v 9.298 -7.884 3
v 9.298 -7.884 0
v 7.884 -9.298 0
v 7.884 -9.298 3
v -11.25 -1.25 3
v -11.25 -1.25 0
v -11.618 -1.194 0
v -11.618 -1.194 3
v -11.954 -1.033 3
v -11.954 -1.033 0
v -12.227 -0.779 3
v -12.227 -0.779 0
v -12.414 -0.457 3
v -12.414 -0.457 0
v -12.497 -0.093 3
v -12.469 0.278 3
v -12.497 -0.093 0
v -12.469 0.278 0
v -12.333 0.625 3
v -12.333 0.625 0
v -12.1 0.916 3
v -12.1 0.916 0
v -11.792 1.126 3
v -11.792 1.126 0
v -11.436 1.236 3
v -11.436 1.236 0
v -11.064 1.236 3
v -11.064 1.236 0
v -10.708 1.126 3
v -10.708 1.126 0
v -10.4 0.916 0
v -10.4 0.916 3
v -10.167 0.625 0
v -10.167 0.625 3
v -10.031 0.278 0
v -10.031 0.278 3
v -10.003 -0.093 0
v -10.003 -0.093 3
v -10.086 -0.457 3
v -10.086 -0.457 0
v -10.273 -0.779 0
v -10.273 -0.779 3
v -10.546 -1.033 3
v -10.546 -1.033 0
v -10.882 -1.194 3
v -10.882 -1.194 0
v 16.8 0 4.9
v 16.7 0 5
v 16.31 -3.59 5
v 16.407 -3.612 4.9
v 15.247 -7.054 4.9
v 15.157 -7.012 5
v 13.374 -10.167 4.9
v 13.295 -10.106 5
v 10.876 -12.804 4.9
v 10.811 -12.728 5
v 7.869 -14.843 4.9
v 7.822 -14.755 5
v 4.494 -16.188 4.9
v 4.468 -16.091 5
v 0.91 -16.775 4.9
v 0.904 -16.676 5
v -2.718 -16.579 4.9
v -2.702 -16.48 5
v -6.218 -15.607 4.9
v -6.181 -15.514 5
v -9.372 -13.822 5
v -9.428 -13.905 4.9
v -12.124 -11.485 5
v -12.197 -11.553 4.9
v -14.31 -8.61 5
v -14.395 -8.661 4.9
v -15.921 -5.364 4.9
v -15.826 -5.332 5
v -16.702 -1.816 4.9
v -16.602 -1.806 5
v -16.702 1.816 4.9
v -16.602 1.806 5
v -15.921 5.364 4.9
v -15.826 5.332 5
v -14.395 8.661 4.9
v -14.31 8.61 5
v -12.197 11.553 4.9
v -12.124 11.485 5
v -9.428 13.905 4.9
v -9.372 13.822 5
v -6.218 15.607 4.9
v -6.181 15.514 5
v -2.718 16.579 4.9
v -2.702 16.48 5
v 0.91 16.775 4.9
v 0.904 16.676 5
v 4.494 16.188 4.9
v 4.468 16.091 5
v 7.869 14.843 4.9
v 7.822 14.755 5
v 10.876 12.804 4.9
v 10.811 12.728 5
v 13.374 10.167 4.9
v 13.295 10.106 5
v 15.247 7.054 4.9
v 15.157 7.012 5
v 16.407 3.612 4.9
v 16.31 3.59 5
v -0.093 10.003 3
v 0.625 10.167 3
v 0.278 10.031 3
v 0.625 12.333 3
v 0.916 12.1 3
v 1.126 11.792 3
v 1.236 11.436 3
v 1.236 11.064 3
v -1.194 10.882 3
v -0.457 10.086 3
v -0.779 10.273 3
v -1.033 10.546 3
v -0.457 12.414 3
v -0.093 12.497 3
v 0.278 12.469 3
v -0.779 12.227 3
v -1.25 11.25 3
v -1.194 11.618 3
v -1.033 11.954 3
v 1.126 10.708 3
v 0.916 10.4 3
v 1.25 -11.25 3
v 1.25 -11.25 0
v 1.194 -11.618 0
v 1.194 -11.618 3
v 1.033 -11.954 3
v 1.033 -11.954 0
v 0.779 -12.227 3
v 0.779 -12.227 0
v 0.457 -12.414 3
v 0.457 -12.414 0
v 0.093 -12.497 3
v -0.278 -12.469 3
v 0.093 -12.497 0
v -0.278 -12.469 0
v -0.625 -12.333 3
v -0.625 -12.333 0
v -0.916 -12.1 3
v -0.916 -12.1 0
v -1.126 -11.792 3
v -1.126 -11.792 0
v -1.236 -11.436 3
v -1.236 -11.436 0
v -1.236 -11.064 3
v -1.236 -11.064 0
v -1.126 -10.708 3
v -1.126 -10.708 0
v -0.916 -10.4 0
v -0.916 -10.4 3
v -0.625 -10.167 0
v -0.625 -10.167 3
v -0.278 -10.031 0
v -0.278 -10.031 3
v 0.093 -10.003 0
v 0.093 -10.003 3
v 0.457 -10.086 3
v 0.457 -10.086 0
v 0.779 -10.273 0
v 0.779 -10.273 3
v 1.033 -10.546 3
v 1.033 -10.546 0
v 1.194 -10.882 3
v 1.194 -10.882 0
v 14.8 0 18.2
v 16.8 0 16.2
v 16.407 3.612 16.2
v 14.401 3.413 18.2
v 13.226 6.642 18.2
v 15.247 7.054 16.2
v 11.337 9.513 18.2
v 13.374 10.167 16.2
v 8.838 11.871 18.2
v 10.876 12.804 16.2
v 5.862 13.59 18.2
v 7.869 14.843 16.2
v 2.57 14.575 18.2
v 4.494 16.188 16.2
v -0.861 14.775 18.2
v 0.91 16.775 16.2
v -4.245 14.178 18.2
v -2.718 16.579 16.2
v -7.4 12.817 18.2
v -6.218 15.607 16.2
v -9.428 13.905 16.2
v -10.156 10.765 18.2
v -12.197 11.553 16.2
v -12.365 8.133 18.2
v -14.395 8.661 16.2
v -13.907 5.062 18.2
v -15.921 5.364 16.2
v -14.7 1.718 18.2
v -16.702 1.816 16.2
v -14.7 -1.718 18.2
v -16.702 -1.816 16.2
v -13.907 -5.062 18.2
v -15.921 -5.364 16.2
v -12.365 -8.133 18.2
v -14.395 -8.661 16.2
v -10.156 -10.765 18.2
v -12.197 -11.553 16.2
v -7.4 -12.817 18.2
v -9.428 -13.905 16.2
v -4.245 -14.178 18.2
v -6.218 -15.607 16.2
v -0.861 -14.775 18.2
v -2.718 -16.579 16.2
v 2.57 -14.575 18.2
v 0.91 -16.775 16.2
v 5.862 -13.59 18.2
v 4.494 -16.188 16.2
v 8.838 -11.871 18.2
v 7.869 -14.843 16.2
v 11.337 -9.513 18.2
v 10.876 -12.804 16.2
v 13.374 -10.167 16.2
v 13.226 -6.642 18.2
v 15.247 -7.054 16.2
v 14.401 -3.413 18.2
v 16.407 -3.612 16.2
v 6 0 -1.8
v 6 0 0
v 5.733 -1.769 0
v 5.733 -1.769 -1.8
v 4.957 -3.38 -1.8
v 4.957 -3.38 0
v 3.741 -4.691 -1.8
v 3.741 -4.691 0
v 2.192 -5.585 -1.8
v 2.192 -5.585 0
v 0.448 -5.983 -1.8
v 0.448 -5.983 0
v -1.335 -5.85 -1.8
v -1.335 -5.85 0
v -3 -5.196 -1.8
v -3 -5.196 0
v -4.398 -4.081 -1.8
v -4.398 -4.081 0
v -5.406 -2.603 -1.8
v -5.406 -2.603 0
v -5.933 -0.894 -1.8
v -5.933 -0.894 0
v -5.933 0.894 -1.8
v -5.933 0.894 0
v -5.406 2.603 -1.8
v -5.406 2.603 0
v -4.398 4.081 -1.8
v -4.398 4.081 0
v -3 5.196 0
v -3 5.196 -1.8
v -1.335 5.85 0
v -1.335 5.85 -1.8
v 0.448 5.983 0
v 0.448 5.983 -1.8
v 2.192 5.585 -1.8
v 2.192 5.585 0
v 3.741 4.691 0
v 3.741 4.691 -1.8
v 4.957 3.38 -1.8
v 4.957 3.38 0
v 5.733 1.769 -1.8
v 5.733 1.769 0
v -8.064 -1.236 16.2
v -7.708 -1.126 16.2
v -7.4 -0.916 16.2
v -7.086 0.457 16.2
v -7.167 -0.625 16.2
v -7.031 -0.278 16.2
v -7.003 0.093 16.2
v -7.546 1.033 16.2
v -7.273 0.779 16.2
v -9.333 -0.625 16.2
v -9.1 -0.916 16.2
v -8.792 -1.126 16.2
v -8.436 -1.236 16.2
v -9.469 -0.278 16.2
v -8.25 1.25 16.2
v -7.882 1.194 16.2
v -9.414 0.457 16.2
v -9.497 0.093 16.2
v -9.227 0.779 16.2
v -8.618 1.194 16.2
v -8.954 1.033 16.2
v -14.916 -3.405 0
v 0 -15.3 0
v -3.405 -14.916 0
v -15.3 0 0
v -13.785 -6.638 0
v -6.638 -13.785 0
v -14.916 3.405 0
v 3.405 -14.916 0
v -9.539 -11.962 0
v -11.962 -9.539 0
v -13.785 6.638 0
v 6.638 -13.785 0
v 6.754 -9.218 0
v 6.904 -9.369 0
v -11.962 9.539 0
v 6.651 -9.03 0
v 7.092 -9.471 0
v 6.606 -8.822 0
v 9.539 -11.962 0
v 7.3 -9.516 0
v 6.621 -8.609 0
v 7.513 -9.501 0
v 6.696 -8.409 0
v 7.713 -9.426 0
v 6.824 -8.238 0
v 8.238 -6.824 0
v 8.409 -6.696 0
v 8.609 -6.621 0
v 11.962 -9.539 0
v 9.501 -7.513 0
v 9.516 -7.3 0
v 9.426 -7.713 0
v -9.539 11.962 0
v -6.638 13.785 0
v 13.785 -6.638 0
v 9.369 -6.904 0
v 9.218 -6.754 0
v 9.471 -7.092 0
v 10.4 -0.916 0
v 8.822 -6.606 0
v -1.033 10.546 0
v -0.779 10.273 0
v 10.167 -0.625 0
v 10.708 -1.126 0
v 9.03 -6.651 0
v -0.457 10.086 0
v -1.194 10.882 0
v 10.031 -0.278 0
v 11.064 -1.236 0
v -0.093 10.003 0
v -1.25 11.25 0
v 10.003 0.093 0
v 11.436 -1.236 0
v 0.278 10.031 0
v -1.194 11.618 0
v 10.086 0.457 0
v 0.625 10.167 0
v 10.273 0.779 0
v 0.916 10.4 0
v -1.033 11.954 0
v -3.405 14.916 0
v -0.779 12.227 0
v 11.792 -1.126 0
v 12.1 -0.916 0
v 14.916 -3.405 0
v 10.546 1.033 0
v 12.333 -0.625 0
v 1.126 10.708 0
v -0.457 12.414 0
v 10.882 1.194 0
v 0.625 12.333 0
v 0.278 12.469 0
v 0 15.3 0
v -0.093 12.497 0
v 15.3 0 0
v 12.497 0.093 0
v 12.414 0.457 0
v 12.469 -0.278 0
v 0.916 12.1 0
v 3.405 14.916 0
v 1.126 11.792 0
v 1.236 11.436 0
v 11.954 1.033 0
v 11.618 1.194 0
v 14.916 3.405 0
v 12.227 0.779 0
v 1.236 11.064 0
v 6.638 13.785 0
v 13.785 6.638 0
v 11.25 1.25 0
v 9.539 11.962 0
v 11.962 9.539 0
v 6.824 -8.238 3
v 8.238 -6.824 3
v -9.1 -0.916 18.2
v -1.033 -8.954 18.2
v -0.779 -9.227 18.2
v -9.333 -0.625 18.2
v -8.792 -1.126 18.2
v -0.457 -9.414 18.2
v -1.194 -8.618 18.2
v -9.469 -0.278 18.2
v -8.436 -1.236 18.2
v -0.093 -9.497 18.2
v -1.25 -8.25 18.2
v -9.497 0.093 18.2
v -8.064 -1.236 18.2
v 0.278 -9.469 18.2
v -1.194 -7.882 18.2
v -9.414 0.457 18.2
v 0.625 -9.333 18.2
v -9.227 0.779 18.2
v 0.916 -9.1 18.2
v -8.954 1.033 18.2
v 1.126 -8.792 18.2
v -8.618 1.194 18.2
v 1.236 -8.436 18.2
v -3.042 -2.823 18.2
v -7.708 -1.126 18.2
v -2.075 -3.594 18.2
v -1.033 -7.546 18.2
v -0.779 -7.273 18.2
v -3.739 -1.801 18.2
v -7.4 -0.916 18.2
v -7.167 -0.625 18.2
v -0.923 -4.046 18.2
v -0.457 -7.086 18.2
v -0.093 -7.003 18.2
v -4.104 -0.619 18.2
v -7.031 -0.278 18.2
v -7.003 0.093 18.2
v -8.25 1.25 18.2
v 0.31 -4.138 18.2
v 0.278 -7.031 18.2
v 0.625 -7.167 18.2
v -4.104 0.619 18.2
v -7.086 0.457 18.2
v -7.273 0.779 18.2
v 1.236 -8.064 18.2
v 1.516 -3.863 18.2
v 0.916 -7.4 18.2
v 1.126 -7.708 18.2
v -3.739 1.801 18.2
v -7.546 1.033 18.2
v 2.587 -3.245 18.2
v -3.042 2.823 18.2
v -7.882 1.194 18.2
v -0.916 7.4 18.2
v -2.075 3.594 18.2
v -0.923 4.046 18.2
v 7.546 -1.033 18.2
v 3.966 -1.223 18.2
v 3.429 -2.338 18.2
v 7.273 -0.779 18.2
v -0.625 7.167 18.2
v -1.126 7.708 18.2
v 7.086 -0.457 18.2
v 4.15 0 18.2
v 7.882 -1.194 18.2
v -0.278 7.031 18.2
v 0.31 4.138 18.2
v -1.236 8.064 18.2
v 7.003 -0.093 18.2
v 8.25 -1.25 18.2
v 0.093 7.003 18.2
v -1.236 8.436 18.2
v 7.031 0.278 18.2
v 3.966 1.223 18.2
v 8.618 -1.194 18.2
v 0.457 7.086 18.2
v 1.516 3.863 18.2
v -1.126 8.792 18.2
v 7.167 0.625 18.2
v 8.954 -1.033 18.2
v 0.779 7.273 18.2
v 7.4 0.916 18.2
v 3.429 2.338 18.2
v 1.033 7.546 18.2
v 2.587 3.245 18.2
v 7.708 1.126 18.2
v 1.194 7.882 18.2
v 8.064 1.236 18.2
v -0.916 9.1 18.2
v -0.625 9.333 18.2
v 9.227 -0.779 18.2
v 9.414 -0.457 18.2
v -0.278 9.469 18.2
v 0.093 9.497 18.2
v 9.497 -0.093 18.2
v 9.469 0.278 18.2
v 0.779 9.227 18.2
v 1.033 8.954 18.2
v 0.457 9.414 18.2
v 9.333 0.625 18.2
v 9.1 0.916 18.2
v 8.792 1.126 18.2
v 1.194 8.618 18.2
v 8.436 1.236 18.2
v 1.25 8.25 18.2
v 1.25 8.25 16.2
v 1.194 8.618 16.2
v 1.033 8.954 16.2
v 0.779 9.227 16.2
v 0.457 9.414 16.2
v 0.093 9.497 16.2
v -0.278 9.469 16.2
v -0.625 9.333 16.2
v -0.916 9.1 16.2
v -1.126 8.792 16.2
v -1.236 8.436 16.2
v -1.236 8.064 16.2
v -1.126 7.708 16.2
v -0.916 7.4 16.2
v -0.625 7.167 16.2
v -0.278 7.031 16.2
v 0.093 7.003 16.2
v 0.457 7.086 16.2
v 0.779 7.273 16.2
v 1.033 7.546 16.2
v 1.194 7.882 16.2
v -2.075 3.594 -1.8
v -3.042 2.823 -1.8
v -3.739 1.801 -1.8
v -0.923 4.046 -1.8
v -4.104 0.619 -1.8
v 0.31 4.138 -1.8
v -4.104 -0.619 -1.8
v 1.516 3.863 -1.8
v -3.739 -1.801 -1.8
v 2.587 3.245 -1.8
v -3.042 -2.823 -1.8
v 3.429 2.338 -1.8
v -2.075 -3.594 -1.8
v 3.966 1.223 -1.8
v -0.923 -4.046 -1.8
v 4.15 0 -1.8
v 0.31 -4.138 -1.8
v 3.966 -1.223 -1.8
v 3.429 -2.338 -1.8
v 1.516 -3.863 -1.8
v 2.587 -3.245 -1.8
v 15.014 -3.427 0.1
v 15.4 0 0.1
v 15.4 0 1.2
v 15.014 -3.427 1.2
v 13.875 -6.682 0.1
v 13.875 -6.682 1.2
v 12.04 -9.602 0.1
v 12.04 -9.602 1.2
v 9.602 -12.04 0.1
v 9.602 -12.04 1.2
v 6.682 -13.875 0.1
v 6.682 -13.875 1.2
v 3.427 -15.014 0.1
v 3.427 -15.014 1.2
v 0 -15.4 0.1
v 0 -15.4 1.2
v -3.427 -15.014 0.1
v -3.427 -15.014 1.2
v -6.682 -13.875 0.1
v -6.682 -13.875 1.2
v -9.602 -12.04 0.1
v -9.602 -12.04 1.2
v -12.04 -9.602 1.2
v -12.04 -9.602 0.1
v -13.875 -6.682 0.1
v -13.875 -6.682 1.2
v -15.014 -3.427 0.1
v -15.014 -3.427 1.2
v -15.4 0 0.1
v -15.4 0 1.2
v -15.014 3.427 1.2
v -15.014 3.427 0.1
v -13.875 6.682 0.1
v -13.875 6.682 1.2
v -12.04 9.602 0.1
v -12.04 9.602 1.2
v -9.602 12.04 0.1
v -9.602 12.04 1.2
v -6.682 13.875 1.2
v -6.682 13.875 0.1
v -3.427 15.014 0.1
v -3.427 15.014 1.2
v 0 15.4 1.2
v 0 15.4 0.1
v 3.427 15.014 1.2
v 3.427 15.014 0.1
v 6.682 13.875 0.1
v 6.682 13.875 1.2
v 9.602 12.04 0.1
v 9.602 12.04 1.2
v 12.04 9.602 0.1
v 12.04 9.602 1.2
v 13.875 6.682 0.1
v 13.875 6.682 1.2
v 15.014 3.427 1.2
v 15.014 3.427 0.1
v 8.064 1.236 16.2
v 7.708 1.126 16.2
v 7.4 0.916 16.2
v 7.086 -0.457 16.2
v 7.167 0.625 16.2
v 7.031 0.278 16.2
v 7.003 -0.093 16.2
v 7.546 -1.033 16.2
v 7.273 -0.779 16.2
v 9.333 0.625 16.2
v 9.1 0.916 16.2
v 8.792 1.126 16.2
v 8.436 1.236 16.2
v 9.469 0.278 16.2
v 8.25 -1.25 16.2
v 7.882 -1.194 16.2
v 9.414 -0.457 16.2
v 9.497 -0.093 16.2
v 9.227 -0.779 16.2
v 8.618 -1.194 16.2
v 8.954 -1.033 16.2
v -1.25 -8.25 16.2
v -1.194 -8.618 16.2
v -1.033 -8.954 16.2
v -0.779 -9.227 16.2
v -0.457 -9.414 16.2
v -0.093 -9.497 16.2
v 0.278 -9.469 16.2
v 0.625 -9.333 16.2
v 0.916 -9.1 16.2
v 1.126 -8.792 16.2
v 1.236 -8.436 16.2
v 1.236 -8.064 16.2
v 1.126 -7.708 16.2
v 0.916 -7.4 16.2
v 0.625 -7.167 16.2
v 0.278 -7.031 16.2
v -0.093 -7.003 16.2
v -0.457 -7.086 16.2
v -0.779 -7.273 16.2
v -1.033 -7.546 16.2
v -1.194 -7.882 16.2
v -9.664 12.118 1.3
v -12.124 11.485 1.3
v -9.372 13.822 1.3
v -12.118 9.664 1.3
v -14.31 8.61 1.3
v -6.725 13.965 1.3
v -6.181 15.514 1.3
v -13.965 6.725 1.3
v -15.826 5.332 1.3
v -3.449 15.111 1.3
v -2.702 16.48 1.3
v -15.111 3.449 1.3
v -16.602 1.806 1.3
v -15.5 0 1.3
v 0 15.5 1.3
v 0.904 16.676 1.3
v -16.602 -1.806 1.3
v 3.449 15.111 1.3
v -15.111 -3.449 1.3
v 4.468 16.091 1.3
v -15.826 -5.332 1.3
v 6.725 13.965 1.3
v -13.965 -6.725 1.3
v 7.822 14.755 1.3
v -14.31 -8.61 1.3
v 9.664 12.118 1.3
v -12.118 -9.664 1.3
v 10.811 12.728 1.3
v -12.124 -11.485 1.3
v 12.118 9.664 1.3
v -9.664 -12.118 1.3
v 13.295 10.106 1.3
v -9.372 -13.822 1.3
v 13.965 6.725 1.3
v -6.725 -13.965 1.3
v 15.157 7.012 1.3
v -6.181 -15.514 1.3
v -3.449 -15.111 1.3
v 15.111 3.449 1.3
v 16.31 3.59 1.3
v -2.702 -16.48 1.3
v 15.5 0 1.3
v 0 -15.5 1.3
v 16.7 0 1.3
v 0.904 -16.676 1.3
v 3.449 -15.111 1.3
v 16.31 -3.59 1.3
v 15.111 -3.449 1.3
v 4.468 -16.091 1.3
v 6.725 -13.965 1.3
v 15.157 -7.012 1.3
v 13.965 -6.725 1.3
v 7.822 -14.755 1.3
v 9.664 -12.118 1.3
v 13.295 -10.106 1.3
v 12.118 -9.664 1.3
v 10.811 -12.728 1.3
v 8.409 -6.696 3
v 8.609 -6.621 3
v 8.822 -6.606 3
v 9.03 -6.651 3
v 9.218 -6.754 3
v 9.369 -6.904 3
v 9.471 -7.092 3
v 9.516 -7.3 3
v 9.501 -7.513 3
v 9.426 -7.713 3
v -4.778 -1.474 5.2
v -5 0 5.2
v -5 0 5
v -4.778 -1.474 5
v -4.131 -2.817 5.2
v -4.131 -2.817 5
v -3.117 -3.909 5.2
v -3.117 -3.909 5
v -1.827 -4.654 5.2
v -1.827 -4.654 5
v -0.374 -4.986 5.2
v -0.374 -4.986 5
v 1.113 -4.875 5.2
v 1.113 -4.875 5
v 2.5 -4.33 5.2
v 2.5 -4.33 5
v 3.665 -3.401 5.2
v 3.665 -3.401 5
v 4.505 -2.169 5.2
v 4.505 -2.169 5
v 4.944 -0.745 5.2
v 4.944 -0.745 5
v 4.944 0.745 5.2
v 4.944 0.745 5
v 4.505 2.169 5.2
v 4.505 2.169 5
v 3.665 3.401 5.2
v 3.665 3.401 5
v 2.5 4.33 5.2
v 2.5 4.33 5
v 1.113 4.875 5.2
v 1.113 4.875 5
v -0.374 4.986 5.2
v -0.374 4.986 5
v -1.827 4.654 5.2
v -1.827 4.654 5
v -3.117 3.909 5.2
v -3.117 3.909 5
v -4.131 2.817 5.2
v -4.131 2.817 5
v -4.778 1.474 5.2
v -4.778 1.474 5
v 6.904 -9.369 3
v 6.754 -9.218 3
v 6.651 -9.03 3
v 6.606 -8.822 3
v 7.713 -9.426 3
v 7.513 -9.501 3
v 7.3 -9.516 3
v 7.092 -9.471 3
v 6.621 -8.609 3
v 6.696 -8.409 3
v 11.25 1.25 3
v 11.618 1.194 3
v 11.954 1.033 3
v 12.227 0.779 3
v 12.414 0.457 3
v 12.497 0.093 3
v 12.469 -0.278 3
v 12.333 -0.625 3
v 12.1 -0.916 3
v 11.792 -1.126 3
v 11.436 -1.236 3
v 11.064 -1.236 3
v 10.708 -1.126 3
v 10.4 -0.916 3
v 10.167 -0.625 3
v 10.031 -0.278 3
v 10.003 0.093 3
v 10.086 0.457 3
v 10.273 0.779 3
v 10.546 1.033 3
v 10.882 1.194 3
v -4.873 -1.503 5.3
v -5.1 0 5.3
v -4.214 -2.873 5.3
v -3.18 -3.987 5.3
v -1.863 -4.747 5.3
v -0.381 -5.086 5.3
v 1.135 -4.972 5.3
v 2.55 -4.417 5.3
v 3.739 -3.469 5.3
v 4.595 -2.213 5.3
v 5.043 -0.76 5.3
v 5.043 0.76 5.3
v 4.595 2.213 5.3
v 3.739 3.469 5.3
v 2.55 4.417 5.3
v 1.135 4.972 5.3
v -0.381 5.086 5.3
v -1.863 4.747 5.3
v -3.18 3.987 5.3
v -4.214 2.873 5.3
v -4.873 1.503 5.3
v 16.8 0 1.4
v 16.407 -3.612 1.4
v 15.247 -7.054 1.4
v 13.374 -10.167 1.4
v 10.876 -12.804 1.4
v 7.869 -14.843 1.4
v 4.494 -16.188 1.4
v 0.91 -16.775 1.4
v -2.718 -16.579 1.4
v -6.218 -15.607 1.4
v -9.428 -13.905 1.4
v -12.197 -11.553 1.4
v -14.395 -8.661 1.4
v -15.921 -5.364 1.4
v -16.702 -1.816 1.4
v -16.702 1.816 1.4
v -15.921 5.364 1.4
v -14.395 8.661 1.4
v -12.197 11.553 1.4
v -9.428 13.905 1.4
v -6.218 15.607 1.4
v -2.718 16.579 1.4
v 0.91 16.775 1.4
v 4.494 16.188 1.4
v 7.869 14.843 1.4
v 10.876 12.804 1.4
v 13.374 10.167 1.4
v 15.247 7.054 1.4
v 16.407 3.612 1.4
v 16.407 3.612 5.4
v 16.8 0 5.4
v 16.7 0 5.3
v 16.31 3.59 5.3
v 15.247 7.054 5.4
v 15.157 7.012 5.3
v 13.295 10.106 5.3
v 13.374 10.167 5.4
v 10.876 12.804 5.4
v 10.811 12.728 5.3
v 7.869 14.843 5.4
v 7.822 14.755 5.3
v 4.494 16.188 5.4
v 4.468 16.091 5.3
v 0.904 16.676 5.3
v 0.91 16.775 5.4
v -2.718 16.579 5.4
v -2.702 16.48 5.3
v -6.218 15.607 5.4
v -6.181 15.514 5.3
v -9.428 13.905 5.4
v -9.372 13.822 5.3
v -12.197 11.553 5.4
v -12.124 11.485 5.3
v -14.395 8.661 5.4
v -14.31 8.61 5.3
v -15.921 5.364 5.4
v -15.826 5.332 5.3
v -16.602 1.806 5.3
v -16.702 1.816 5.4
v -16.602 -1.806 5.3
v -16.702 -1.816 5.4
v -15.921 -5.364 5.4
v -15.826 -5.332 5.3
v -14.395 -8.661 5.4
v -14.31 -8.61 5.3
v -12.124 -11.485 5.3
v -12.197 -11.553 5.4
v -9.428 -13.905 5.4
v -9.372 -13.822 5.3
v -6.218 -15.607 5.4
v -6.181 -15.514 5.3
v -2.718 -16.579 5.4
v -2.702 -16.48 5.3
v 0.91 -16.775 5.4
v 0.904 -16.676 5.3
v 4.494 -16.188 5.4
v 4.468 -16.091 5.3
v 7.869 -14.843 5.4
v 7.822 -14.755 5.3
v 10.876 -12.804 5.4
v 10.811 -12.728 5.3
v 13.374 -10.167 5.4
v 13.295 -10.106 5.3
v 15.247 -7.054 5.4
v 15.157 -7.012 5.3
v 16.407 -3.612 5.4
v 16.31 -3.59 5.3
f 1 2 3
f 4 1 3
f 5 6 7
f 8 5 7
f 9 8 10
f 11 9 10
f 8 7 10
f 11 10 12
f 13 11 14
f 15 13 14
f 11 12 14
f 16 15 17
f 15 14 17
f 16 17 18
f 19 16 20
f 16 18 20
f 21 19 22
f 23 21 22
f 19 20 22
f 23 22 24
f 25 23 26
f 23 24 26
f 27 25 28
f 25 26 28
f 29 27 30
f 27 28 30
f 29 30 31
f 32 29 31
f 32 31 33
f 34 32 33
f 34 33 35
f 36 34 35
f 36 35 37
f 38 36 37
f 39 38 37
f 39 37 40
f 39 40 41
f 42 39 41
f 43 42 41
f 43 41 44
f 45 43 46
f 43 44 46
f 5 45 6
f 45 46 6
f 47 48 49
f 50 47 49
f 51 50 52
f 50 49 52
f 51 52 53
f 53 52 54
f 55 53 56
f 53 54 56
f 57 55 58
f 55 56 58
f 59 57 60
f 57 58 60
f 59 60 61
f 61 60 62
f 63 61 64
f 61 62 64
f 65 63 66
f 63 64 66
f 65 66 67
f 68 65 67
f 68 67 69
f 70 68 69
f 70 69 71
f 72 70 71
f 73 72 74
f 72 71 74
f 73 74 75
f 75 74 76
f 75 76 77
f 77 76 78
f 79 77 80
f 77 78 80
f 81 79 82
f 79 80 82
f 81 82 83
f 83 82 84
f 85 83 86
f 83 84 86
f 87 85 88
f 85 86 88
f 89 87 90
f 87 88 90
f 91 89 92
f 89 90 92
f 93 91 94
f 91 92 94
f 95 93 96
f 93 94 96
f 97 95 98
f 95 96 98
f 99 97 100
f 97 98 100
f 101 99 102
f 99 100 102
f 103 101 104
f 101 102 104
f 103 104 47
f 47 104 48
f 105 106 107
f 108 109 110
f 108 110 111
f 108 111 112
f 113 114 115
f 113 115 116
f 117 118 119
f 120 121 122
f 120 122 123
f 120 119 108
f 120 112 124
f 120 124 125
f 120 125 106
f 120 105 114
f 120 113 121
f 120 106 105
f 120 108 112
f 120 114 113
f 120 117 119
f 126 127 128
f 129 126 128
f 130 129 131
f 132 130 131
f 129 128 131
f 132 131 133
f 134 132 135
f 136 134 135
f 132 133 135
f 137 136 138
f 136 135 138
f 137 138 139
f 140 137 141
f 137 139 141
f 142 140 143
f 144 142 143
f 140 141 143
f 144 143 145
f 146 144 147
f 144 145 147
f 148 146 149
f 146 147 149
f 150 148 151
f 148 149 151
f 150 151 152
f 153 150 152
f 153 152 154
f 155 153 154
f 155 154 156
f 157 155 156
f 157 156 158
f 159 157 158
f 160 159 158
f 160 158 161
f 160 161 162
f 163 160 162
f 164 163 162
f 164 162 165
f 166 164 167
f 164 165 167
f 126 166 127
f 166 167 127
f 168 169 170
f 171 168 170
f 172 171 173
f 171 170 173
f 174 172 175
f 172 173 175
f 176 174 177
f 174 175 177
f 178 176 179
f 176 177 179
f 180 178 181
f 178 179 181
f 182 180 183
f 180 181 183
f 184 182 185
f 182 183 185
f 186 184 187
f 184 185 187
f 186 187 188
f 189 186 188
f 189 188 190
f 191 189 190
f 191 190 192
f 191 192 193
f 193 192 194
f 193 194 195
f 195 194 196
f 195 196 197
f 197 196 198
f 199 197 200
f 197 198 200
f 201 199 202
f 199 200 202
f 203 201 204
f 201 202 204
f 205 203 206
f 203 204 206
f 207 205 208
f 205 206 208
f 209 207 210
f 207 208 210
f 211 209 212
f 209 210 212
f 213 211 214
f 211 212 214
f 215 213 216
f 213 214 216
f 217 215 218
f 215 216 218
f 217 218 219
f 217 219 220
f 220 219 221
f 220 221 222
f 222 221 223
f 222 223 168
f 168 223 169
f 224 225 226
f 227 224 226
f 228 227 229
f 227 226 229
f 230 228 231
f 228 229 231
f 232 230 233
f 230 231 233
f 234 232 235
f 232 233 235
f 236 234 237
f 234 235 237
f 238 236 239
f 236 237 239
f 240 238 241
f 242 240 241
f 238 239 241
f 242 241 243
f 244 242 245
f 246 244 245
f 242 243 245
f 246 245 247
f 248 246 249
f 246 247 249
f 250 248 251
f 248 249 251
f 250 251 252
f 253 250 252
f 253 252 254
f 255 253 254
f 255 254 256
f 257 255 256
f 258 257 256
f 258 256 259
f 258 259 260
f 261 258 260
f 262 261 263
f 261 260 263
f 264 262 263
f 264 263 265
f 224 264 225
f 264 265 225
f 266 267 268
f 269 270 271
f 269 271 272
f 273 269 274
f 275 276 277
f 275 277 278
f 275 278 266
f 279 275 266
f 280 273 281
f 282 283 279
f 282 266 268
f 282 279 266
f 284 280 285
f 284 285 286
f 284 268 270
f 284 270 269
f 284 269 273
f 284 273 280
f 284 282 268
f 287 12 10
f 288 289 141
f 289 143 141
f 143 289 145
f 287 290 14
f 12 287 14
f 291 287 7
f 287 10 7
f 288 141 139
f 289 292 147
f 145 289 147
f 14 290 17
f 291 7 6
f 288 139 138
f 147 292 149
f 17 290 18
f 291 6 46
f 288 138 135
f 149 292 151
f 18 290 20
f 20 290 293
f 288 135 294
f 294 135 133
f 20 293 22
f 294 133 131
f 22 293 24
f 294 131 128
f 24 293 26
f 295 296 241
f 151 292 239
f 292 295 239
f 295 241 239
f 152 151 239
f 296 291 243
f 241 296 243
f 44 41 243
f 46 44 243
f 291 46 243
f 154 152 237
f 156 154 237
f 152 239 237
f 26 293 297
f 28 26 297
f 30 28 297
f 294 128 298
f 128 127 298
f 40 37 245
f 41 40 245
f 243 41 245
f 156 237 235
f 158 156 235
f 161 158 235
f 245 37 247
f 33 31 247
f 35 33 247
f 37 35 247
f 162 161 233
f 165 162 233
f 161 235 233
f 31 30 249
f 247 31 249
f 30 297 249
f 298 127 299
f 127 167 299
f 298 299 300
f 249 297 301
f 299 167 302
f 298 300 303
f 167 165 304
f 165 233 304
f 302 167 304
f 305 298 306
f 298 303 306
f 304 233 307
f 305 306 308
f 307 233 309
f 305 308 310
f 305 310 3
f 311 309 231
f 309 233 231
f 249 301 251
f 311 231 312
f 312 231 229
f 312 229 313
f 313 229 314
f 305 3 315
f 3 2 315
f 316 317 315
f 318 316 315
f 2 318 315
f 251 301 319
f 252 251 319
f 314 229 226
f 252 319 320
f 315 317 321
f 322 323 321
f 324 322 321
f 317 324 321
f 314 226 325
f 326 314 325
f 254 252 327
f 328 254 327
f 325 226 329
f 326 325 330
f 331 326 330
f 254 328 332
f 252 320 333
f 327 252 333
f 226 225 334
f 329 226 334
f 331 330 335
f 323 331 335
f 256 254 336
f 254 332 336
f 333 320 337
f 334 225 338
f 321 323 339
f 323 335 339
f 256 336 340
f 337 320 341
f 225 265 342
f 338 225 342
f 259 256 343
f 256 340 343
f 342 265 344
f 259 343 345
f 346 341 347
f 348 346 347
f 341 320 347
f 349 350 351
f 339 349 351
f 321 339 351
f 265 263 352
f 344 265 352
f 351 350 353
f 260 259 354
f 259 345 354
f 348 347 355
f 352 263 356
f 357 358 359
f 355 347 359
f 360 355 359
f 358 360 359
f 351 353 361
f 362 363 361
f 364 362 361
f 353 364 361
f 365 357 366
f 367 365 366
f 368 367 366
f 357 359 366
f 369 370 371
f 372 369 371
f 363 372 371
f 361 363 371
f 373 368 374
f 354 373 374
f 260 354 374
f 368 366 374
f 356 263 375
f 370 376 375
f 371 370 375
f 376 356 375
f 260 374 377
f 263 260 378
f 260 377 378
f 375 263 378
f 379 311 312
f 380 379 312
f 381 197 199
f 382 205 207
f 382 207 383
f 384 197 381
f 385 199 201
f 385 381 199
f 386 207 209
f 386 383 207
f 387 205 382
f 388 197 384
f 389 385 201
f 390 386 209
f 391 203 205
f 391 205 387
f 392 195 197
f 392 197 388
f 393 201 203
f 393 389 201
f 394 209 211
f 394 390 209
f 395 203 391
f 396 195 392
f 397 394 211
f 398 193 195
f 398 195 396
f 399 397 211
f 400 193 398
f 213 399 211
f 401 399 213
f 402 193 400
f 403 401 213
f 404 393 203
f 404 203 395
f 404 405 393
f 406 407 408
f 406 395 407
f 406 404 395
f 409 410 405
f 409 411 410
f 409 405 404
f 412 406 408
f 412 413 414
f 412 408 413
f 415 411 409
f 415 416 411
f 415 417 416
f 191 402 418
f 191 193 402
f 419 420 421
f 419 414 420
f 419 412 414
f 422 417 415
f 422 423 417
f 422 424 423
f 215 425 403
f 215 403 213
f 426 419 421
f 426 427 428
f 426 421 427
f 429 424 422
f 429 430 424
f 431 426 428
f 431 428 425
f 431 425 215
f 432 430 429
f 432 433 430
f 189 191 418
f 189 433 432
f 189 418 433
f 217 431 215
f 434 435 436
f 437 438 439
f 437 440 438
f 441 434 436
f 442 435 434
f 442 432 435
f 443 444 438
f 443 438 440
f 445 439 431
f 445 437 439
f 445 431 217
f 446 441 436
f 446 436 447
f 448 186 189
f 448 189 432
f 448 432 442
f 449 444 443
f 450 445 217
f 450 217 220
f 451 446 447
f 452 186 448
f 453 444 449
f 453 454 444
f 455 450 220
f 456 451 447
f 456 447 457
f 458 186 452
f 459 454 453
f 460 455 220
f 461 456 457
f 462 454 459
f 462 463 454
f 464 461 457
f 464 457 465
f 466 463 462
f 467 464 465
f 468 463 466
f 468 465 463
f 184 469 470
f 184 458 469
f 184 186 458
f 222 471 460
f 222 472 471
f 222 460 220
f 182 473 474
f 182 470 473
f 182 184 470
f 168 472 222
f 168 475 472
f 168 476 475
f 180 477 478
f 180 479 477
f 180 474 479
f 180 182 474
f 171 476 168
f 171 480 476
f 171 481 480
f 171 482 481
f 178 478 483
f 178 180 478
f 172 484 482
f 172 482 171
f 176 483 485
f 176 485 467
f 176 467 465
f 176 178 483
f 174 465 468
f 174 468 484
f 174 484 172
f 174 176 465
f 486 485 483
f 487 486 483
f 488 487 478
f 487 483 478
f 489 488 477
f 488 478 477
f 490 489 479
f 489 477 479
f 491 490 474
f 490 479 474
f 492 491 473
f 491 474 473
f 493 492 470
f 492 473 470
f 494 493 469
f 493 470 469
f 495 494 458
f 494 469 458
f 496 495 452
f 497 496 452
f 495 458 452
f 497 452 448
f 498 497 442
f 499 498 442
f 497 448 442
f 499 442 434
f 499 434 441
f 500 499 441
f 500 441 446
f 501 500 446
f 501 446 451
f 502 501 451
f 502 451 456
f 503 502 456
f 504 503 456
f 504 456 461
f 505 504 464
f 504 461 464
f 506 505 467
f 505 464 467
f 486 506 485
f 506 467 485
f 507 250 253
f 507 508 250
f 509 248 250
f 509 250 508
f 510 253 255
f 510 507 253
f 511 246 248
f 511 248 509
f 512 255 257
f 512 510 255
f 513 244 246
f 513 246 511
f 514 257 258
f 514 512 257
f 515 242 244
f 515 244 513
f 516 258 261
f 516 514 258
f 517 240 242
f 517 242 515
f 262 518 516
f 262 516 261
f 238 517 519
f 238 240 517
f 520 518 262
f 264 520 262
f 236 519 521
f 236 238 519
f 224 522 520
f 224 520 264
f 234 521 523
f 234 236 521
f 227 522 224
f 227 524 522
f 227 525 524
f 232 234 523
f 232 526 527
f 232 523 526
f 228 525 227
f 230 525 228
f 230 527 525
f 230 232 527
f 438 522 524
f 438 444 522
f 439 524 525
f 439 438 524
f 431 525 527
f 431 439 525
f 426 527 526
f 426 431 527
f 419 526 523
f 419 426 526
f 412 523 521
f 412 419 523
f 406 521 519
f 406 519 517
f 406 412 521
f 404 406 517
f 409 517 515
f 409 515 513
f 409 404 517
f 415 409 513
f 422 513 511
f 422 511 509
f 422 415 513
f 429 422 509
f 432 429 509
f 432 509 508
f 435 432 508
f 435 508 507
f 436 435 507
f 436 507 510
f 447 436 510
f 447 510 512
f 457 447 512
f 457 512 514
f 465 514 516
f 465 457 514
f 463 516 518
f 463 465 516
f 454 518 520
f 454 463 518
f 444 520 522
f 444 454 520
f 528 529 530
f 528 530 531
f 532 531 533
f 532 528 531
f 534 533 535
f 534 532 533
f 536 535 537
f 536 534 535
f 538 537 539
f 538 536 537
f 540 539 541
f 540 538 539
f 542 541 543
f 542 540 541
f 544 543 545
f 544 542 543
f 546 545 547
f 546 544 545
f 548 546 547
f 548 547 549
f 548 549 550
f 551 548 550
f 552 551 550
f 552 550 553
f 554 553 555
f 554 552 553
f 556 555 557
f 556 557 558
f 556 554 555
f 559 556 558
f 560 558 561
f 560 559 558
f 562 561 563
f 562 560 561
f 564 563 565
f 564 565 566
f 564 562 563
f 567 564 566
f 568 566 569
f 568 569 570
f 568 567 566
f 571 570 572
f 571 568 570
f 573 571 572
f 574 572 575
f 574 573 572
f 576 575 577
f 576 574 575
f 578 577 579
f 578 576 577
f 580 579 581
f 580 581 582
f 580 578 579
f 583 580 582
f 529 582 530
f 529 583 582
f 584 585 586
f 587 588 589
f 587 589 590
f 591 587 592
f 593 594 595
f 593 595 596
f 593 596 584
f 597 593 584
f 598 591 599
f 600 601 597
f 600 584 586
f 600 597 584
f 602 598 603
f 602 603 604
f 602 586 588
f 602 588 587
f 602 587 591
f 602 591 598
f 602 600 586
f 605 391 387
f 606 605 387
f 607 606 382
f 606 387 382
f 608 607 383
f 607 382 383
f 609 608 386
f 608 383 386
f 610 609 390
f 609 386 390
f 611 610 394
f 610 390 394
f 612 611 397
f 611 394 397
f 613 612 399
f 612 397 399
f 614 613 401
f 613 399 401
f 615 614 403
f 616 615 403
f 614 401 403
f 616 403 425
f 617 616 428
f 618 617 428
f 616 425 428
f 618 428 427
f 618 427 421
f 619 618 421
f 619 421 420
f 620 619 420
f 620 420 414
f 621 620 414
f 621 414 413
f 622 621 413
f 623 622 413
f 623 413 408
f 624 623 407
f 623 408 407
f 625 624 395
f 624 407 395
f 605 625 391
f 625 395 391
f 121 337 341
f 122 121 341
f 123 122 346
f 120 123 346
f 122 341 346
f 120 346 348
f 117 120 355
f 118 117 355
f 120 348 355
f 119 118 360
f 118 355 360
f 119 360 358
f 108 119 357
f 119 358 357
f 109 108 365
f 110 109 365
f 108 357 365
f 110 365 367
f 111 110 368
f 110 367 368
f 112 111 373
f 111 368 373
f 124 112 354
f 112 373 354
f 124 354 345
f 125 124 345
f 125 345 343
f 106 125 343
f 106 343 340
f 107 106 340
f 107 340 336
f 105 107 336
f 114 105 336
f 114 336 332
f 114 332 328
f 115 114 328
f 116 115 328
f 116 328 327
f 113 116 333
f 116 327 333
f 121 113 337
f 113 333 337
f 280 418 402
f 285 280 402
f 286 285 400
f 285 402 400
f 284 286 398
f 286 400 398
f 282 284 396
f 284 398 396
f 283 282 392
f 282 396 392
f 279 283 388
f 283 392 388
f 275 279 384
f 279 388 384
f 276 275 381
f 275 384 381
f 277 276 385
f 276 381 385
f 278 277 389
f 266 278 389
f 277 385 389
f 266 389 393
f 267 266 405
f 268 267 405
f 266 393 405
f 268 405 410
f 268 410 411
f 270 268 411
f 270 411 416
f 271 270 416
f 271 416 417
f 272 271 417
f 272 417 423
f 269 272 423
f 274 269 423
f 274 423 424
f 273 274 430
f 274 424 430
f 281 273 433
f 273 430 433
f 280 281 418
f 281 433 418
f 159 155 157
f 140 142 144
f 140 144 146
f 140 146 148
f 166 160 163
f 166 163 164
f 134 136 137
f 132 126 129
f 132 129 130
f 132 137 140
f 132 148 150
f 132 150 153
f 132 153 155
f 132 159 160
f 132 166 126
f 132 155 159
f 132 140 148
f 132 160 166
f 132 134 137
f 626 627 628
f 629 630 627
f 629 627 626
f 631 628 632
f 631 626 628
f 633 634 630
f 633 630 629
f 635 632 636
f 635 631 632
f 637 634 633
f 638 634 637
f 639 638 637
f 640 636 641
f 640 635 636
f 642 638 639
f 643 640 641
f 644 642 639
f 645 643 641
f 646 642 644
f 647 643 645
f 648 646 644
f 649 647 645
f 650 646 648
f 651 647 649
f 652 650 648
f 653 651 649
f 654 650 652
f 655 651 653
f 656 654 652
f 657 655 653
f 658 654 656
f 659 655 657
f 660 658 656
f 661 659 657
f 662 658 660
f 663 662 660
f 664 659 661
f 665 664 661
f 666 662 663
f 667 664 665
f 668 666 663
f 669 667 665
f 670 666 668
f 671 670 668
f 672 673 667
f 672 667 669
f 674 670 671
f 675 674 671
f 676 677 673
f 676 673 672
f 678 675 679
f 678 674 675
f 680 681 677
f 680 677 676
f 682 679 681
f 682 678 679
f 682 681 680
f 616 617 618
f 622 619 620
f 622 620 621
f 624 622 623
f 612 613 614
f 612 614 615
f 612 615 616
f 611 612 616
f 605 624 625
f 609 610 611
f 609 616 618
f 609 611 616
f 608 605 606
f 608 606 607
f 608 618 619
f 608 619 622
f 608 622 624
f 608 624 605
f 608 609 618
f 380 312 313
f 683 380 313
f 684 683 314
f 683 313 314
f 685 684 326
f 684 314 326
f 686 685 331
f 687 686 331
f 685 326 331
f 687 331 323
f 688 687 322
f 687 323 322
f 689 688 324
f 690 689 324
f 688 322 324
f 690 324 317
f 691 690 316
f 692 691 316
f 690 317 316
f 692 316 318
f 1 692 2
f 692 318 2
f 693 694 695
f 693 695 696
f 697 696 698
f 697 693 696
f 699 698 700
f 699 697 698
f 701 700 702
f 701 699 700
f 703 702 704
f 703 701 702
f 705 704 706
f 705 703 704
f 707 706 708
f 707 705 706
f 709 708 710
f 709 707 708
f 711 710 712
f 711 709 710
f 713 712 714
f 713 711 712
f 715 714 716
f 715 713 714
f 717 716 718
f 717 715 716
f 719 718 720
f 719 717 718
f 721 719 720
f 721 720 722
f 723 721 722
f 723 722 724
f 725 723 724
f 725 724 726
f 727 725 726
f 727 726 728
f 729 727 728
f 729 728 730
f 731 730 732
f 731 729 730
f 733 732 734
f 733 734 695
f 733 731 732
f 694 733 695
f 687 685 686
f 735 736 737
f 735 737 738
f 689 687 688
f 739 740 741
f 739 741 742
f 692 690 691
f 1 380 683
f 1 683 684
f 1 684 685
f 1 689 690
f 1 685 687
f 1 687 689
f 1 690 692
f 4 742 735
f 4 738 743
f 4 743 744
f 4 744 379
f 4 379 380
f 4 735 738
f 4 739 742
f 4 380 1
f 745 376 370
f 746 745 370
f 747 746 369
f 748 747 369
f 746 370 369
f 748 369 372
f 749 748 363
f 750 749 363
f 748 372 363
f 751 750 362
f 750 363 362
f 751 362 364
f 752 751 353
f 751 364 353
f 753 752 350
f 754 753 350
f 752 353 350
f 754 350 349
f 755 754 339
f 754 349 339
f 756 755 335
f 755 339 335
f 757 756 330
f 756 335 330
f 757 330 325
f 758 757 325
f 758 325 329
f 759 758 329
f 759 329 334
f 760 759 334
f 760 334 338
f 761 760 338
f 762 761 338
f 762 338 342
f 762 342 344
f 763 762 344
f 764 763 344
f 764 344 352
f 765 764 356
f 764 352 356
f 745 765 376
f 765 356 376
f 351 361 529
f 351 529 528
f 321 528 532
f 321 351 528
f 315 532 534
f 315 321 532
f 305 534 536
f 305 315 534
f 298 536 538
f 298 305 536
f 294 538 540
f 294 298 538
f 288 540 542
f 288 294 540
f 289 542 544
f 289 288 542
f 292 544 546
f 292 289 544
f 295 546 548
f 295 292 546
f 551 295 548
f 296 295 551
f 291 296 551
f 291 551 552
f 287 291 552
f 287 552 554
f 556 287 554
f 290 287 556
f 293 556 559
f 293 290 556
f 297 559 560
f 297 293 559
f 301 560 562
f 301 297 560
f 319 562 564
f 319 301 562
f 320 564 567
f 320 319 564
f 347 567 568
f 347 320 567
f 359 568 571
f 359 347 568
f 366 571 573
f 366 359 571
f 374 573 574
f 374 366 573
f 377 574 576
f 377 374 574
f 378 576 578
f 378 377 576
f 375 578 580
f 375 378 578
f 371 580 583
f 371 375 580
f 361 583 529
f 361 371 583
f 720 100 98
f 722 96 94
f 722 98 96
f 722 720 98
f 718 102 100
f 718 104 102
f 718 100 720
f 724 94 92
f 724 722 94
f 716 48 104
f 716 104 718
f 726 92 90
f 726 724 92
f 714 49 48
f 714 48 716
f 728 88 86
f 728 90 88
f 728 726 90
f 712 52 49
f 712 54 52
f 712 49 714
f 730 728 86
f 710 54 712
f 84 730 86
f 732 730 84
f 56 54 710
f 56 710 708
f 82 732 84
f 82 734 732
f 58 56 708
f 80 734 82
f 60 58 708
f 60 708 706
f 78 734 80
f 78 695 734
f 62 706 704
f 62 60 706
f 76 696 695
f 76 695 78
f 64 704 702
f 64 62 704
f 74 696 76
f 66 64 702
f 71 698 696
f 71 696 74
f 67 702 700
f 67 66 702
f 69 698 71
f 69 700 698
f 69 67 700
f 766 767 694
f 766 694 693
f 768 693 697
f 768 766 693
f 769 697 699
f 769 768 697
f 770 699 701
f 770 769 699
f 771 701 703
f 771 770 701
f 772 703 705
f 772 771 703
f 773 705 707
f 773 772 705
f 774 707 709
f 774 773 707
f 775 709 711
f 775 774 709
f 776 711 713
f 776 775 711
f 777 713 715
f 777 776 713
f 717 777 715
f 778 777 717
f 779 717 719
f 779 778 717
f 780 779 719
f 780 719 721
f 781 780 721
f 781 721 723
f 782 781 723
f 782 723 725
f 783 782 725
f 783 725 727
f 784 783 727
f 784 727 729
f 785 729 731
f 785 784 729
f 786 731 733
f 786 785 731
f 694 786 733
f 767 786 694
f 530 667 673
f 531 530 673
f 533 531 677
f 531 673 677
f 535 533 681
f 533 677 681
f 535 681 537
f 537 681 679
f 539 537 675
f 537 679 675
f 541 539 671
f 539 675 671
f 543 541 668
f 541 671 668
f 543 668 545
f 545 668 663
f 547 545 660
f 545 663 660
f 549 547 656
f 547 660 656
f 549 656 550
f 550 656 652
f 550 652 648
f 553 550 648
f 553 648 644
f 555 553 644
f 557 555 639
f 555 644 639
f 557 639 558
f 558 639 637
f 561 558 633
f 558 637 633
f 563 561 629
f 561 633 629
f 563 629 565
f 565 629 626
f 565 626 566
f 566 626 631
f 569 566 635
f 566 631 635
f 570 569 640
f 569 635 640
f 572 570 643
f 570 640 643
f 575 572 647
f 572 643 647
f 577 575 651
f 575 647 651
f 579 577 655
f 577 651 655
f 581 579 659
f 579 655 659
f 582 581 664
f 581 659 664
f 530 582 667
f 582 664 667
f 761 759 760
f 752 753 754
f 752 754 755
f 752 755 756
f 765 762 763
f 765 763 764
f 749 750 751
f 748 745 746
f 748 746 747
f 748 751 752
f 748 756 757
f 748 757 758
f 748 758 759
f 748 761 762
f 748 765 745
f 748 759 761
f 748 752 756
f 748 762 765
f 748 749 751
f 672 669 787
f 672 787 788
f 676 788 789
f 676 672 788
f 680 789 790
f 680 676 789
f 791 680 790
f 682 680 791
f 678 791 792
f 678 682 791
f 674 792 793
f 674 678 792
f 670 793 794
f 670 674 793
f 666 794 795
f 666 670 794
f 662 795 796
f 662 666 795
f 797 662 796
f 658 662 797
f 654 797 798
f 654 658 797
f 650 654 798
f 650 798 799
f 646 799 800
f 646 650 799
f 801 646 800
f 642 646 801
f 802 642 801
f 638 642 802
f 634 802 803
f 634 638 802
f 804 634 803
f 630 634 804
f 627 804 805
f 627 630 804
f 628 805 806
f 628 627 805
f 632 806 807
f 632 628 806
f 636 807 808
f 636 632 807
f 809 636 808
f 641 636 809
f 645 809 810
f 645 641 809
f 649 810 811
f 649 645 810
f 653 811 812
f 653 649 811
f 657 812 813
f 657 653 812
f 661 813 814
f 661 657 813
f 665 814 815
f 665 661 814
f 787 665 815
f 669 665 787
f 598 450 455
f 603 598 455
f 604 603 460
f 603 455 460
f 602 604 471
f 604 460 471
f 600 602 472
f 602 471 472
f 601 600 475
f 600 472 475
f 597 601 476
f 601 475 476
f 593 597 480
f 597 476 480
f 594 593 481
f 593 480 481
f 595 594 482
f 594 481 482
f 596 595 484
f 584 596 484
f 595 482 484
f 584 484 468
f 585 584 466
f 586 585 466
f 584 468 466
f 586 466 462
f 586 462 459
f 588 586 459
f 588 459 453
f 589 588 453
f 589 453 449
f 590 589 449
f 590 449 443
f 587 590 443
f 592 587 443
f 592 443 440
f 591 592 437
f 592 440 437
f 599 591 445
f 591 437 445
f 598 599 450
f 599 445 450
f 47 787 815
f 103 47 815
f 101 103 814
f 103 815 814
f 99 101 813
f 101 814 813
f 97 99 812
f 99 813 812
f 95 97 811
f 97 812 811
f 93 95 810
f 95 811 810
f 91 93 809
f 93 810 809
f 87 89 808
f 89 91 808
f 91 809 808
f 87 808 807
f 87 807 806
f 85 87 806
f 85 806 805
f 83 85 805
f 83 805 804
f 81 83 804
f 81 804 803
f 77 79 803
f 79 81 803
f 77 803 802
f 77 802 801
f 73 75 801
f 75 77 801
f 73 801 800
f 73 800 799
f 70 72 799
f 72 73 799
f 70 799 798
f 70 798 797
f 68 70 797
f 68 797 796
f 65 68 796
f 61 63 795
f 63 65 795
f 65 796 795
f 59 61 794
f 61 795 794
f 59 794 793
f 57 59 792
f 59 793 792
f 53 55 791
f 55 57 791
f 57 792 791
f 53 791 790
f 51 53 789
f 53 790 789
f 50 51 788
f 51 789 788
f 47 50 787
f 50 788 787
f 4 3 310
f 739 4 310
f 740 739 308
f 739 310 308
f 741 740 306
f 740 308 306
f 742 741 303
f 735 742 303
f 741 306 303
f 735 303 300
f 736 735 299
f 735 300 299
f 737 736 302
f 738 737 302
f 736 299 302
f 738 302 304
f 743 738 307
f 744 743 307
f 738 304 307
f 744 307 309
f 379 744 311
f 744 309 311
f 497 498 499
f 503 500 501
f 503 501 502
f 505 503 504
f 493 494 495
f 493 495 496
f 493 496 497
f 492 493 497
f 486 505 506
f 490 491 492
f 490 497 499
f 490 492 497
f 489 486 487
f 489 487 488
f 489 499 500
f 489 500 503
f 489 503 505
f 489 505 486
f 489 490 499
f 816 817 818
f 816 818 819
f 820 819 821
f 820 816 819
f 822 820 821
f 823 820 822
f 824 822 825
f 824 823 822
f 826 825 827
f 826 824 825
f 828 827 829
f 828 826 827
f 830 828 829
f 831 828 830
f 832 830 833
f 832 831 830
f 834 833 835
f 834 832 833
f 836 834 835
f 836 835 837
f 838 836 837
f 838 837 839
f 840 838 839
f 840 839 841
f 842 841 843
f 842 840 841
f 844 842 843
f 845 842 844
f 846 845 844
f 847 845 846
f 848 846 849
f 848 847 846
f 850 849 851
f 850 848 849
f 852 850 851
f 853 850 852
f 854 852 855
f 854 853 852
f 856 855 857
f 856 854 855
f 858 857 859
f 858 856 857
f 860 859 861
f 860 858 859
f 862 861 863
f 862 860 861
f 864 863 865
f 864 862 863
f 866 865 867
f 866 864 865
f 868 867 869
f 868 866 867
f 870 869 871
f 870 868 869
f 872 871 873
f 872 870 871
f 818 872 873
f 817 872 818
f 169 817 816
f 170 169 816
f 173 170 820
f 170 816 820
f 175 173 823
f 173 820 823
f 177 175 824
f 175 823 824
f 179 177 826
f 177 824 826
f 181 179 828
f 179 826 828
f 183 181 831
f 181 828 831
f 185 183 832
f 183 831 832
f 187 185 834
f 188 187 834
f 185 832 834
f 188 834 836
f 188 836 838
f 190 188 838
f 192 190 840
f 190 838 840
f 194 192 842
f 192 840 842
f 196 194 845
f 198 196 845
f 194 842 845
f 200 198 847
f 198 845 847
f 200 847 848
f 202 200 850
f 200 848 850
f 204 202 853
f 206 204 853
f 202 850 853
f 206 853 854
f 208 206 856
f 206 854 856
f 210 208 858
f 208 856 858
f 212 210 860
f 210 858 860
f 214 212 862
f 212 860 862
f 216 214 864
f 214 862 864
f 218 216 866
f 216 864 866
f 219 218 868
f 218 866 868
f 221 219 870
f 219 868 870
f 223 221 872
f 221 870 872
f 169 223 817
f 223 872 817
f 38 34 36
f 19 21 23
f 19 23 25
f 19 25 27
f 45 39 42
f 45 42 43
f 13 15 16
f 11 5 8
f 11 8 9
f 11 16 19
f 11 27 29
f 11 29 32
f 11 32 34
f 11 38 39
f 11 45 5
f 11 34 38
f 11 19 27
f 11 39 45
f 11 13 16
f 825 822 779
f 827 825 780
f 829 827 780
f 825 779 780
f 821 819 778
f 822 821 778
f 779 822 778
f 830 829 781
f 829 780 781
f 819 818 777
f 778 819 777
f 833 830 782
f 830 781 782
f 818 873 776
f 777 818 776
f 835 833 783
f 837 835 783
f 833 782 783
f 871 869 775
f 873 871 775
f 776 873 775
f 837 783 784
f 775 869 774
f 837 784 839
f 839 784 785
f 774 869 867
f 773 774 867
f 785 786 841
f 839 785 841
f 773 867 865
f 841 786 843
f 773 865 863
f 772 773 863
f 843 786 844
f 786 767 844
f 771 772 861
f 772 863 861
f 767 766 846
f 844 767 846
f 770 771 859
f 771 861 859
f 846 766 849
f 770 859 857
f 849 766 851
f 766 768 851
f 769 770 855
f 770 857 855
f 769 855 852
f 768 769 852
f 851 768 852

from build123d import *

# Parameters (mm, degrees)
SKETCH_R              = 16.8
PAD_DEPTH             = 18.2
SKETCH001_R           = 1.25
POCKET_DEPTH          = 2
POLARPATTERN_COUNT    = 4
SKETCH002_R           = 4.15
POCKET001_DEPTH       = 18.201
SKETCH003_R           = 1.25
POCKET002_DEPTH       = 3
POLARPATTERN001_COUNT = 4
SKETCH004_R           = 6
SKETCH004_R_2         = 4.15
PAD001_DEPTH          = 1.8
SKETCH005_R           = 16.8
SKETCH005_R_2         = 15.4
POCKET003_DEPTH       = 1.3
SKETCH006_W           = 11.8
SKETCH006_H           = 0.3
CHAMFER_SIZE          = 2
CHAMFER001_SIZE       = 0.1
CHAMFER002_SIZE       = 0.1
CHAMFER003_SIZE       = 0.1
CHAMFER004_SIZE       = 0.1
CHAMFER005_SIZE       = 0.1
POCKET004_DEPTH       = 3


with BuildPart() as part:
    # Sketch → Pad (new body)
    with BuildSketch(Plane.XY):
        Circle(SKETCH_R)
    extrude(amount=PAD_DEPTH)

    # Sketch001 (on Face3 of Pad) → Pocket (cut)
    with BuildSketch(Plane.XY.offset(18.2)):
        with Locations((0, 8.25)):
            Circle(SKETCH001_R)
    pocket = extrude(amount=-POCKET_DEPTH, mode=Mode.SUBTRACT)

    # PolarPattern: Pocket ×4 about axis
    polarpattern_axis = Axis((0, 0, 18.2), (0, 0, 1))
    for i in range(1, POLARPATTERN_COUNT):
        add(pocket.rotate(polarpattern_axis, i * 360 / POLARPATTERN_COUNT), mode=Mode.SUBTRACT)

    # Sketch002 (on Face3 of PolarPattern) → Pocket001 (cut, through all)
    with BuildSketch(Plane.XY.offset(18.2)):
        Circle(SKETCH002_R)
    extrude(amount=-POCKET001_DEPTH, mode=Mode.SUBTRACT)

    # Sketch003 (on Face2 of Pocket001) → Pocket002 (cut)
    with BuildSketch(Plane(origin=(0, 0, 0), x_dir=(1, 0, 0), z_dir=(0, 0, -1))):
        with Locations((0, 11.25)):
            Circle(SKETCH003_R)
    pocket002 = extrude(amount=-POCKET002_DEPTH, mode=Mode.SUBTRACT)

    # PolarPattern001: Pocket002 ×4 about axis
    polarpattern001_axis = Axis((0, 0, 0), (0, 0, -1))
    for i in range(1, POLARPATTERN001_COUNT):
        add(pocket002.rotate(polarpattern001_axis, i * 360 / POLARPATTERN001_COUNT), mode=Mode.SUBTRACT)

    # Sketch004 (on Face2 of PolarPattern001) → Pad001 (join)
    with BuildSketch(Plane(origin=(0, 0, 0), x_dir=(1, 0, 0), z_dir=(0, 0, -1))):
        Circle(SKETCH004_R)
        Circle(SKETCH004_R_2, mode=Mode.SUBTRACT)
    extrude(amount=PAD001_DEPTH)

    # Sketch005 (on Face2 of Pad001) → Pocket003 (cut)
    with BuildSketch(Plane(origin=(0, 0, 0), x_dir=(1, 0, 0), z_dir=(0, 0, -1))):
        Circle(SKETCH005_R)
        Circle(SKETCH005_R_2, mode=Mode.SUBTRACT)
    extrude(amount=-POCKET003_DEPTH, mode=Mode.SUBTRACT)

    # Sketch006 → Groove (revolve, cut)
    with BuildSketch(Plane.XZ):
        with Locations((-10.9, 5.15)):
            Rectangle(SKETCH006_W, SKETCH006_H)
    revolve(axis=Axis((0, 0, 0), (0, 0, 1)), mode=Mode.SUBTRACT)

    # Chamfer
    chamfer_edges = [part.edges().sort_by_distance(p)[0] for p in [
        (-16.8, 0, 18.2),
    ]]
    chamfer(chamfer_edges, length=CHAMFER_SIZE)

    # Chamfer001
    chamfer001_edges = [part.edges().sort_by_distance(p)[0] for p in [
        (-16.8, 0, 1.3),
    ]]
    chamfer(chamfer001_edges, length=CHAMFER001_SIZE)

    # Chamfer002
    chamfer002_edges = [part.edges().sort_by_distance(p)[0] for p in [
        (-15.4, 0, 0),
    ]]
    chamfer(chamfer002_edges, length=CHAMFER002_SIZE)

    # Chamfer003
    chamfer003_edges = [part.edges().sort_by_distance(p)[0] for p in [
        (-15.4, 0, 1.3),
    ]]
    chamfer(chamfer003_edges, length=CHAMFER003_SIZE)

    # Chamfer004
    chamfer004_edges = [part.edges().sort_by_distance(p)[0] for p in [
        (0, -16.8, 5),
    ]]
    chamfer(chamfer004_edges, length=CHAMFER004_SIZE)

    # Chamfer005
    chamfer005_edges = [part.edges().sort_by_distance(p)[0] for p in [
        (5, 0, 5.3),
        (0, 16.8, 5.3),
        (0, -16.8, 5.3),
    ]]
    chamfer(chamfer005_edges, length=CHAMFER005_SIZE)

    # Sketch007 (on Face29 of Chamfer005) → Pocket004 (cut)
    with BuildSketch(Plane(origin=(0, 0, 0), x_dir=(1, 0, 0), z_dir=(0, 0, -1))):
        with BuildLine():
            ThreePointArc((7.884241, 9.298454), (6.82358, 9.298454), (6.82358, 8.237794))
            Line((6.82358, 8.237794), (8.237794, 6.82358))
            ThreePointArc((8.237794, 6.82358), (9.298454, 6.82358), (9.298454, 7.884241))
            Line((9.298454, 7.884241), (7.884241, 9.298454))
        make_face()
    extrude(amount=-POCKET004_DEPTH, mode=Mode.SUBTRACT)


solid = part.part
